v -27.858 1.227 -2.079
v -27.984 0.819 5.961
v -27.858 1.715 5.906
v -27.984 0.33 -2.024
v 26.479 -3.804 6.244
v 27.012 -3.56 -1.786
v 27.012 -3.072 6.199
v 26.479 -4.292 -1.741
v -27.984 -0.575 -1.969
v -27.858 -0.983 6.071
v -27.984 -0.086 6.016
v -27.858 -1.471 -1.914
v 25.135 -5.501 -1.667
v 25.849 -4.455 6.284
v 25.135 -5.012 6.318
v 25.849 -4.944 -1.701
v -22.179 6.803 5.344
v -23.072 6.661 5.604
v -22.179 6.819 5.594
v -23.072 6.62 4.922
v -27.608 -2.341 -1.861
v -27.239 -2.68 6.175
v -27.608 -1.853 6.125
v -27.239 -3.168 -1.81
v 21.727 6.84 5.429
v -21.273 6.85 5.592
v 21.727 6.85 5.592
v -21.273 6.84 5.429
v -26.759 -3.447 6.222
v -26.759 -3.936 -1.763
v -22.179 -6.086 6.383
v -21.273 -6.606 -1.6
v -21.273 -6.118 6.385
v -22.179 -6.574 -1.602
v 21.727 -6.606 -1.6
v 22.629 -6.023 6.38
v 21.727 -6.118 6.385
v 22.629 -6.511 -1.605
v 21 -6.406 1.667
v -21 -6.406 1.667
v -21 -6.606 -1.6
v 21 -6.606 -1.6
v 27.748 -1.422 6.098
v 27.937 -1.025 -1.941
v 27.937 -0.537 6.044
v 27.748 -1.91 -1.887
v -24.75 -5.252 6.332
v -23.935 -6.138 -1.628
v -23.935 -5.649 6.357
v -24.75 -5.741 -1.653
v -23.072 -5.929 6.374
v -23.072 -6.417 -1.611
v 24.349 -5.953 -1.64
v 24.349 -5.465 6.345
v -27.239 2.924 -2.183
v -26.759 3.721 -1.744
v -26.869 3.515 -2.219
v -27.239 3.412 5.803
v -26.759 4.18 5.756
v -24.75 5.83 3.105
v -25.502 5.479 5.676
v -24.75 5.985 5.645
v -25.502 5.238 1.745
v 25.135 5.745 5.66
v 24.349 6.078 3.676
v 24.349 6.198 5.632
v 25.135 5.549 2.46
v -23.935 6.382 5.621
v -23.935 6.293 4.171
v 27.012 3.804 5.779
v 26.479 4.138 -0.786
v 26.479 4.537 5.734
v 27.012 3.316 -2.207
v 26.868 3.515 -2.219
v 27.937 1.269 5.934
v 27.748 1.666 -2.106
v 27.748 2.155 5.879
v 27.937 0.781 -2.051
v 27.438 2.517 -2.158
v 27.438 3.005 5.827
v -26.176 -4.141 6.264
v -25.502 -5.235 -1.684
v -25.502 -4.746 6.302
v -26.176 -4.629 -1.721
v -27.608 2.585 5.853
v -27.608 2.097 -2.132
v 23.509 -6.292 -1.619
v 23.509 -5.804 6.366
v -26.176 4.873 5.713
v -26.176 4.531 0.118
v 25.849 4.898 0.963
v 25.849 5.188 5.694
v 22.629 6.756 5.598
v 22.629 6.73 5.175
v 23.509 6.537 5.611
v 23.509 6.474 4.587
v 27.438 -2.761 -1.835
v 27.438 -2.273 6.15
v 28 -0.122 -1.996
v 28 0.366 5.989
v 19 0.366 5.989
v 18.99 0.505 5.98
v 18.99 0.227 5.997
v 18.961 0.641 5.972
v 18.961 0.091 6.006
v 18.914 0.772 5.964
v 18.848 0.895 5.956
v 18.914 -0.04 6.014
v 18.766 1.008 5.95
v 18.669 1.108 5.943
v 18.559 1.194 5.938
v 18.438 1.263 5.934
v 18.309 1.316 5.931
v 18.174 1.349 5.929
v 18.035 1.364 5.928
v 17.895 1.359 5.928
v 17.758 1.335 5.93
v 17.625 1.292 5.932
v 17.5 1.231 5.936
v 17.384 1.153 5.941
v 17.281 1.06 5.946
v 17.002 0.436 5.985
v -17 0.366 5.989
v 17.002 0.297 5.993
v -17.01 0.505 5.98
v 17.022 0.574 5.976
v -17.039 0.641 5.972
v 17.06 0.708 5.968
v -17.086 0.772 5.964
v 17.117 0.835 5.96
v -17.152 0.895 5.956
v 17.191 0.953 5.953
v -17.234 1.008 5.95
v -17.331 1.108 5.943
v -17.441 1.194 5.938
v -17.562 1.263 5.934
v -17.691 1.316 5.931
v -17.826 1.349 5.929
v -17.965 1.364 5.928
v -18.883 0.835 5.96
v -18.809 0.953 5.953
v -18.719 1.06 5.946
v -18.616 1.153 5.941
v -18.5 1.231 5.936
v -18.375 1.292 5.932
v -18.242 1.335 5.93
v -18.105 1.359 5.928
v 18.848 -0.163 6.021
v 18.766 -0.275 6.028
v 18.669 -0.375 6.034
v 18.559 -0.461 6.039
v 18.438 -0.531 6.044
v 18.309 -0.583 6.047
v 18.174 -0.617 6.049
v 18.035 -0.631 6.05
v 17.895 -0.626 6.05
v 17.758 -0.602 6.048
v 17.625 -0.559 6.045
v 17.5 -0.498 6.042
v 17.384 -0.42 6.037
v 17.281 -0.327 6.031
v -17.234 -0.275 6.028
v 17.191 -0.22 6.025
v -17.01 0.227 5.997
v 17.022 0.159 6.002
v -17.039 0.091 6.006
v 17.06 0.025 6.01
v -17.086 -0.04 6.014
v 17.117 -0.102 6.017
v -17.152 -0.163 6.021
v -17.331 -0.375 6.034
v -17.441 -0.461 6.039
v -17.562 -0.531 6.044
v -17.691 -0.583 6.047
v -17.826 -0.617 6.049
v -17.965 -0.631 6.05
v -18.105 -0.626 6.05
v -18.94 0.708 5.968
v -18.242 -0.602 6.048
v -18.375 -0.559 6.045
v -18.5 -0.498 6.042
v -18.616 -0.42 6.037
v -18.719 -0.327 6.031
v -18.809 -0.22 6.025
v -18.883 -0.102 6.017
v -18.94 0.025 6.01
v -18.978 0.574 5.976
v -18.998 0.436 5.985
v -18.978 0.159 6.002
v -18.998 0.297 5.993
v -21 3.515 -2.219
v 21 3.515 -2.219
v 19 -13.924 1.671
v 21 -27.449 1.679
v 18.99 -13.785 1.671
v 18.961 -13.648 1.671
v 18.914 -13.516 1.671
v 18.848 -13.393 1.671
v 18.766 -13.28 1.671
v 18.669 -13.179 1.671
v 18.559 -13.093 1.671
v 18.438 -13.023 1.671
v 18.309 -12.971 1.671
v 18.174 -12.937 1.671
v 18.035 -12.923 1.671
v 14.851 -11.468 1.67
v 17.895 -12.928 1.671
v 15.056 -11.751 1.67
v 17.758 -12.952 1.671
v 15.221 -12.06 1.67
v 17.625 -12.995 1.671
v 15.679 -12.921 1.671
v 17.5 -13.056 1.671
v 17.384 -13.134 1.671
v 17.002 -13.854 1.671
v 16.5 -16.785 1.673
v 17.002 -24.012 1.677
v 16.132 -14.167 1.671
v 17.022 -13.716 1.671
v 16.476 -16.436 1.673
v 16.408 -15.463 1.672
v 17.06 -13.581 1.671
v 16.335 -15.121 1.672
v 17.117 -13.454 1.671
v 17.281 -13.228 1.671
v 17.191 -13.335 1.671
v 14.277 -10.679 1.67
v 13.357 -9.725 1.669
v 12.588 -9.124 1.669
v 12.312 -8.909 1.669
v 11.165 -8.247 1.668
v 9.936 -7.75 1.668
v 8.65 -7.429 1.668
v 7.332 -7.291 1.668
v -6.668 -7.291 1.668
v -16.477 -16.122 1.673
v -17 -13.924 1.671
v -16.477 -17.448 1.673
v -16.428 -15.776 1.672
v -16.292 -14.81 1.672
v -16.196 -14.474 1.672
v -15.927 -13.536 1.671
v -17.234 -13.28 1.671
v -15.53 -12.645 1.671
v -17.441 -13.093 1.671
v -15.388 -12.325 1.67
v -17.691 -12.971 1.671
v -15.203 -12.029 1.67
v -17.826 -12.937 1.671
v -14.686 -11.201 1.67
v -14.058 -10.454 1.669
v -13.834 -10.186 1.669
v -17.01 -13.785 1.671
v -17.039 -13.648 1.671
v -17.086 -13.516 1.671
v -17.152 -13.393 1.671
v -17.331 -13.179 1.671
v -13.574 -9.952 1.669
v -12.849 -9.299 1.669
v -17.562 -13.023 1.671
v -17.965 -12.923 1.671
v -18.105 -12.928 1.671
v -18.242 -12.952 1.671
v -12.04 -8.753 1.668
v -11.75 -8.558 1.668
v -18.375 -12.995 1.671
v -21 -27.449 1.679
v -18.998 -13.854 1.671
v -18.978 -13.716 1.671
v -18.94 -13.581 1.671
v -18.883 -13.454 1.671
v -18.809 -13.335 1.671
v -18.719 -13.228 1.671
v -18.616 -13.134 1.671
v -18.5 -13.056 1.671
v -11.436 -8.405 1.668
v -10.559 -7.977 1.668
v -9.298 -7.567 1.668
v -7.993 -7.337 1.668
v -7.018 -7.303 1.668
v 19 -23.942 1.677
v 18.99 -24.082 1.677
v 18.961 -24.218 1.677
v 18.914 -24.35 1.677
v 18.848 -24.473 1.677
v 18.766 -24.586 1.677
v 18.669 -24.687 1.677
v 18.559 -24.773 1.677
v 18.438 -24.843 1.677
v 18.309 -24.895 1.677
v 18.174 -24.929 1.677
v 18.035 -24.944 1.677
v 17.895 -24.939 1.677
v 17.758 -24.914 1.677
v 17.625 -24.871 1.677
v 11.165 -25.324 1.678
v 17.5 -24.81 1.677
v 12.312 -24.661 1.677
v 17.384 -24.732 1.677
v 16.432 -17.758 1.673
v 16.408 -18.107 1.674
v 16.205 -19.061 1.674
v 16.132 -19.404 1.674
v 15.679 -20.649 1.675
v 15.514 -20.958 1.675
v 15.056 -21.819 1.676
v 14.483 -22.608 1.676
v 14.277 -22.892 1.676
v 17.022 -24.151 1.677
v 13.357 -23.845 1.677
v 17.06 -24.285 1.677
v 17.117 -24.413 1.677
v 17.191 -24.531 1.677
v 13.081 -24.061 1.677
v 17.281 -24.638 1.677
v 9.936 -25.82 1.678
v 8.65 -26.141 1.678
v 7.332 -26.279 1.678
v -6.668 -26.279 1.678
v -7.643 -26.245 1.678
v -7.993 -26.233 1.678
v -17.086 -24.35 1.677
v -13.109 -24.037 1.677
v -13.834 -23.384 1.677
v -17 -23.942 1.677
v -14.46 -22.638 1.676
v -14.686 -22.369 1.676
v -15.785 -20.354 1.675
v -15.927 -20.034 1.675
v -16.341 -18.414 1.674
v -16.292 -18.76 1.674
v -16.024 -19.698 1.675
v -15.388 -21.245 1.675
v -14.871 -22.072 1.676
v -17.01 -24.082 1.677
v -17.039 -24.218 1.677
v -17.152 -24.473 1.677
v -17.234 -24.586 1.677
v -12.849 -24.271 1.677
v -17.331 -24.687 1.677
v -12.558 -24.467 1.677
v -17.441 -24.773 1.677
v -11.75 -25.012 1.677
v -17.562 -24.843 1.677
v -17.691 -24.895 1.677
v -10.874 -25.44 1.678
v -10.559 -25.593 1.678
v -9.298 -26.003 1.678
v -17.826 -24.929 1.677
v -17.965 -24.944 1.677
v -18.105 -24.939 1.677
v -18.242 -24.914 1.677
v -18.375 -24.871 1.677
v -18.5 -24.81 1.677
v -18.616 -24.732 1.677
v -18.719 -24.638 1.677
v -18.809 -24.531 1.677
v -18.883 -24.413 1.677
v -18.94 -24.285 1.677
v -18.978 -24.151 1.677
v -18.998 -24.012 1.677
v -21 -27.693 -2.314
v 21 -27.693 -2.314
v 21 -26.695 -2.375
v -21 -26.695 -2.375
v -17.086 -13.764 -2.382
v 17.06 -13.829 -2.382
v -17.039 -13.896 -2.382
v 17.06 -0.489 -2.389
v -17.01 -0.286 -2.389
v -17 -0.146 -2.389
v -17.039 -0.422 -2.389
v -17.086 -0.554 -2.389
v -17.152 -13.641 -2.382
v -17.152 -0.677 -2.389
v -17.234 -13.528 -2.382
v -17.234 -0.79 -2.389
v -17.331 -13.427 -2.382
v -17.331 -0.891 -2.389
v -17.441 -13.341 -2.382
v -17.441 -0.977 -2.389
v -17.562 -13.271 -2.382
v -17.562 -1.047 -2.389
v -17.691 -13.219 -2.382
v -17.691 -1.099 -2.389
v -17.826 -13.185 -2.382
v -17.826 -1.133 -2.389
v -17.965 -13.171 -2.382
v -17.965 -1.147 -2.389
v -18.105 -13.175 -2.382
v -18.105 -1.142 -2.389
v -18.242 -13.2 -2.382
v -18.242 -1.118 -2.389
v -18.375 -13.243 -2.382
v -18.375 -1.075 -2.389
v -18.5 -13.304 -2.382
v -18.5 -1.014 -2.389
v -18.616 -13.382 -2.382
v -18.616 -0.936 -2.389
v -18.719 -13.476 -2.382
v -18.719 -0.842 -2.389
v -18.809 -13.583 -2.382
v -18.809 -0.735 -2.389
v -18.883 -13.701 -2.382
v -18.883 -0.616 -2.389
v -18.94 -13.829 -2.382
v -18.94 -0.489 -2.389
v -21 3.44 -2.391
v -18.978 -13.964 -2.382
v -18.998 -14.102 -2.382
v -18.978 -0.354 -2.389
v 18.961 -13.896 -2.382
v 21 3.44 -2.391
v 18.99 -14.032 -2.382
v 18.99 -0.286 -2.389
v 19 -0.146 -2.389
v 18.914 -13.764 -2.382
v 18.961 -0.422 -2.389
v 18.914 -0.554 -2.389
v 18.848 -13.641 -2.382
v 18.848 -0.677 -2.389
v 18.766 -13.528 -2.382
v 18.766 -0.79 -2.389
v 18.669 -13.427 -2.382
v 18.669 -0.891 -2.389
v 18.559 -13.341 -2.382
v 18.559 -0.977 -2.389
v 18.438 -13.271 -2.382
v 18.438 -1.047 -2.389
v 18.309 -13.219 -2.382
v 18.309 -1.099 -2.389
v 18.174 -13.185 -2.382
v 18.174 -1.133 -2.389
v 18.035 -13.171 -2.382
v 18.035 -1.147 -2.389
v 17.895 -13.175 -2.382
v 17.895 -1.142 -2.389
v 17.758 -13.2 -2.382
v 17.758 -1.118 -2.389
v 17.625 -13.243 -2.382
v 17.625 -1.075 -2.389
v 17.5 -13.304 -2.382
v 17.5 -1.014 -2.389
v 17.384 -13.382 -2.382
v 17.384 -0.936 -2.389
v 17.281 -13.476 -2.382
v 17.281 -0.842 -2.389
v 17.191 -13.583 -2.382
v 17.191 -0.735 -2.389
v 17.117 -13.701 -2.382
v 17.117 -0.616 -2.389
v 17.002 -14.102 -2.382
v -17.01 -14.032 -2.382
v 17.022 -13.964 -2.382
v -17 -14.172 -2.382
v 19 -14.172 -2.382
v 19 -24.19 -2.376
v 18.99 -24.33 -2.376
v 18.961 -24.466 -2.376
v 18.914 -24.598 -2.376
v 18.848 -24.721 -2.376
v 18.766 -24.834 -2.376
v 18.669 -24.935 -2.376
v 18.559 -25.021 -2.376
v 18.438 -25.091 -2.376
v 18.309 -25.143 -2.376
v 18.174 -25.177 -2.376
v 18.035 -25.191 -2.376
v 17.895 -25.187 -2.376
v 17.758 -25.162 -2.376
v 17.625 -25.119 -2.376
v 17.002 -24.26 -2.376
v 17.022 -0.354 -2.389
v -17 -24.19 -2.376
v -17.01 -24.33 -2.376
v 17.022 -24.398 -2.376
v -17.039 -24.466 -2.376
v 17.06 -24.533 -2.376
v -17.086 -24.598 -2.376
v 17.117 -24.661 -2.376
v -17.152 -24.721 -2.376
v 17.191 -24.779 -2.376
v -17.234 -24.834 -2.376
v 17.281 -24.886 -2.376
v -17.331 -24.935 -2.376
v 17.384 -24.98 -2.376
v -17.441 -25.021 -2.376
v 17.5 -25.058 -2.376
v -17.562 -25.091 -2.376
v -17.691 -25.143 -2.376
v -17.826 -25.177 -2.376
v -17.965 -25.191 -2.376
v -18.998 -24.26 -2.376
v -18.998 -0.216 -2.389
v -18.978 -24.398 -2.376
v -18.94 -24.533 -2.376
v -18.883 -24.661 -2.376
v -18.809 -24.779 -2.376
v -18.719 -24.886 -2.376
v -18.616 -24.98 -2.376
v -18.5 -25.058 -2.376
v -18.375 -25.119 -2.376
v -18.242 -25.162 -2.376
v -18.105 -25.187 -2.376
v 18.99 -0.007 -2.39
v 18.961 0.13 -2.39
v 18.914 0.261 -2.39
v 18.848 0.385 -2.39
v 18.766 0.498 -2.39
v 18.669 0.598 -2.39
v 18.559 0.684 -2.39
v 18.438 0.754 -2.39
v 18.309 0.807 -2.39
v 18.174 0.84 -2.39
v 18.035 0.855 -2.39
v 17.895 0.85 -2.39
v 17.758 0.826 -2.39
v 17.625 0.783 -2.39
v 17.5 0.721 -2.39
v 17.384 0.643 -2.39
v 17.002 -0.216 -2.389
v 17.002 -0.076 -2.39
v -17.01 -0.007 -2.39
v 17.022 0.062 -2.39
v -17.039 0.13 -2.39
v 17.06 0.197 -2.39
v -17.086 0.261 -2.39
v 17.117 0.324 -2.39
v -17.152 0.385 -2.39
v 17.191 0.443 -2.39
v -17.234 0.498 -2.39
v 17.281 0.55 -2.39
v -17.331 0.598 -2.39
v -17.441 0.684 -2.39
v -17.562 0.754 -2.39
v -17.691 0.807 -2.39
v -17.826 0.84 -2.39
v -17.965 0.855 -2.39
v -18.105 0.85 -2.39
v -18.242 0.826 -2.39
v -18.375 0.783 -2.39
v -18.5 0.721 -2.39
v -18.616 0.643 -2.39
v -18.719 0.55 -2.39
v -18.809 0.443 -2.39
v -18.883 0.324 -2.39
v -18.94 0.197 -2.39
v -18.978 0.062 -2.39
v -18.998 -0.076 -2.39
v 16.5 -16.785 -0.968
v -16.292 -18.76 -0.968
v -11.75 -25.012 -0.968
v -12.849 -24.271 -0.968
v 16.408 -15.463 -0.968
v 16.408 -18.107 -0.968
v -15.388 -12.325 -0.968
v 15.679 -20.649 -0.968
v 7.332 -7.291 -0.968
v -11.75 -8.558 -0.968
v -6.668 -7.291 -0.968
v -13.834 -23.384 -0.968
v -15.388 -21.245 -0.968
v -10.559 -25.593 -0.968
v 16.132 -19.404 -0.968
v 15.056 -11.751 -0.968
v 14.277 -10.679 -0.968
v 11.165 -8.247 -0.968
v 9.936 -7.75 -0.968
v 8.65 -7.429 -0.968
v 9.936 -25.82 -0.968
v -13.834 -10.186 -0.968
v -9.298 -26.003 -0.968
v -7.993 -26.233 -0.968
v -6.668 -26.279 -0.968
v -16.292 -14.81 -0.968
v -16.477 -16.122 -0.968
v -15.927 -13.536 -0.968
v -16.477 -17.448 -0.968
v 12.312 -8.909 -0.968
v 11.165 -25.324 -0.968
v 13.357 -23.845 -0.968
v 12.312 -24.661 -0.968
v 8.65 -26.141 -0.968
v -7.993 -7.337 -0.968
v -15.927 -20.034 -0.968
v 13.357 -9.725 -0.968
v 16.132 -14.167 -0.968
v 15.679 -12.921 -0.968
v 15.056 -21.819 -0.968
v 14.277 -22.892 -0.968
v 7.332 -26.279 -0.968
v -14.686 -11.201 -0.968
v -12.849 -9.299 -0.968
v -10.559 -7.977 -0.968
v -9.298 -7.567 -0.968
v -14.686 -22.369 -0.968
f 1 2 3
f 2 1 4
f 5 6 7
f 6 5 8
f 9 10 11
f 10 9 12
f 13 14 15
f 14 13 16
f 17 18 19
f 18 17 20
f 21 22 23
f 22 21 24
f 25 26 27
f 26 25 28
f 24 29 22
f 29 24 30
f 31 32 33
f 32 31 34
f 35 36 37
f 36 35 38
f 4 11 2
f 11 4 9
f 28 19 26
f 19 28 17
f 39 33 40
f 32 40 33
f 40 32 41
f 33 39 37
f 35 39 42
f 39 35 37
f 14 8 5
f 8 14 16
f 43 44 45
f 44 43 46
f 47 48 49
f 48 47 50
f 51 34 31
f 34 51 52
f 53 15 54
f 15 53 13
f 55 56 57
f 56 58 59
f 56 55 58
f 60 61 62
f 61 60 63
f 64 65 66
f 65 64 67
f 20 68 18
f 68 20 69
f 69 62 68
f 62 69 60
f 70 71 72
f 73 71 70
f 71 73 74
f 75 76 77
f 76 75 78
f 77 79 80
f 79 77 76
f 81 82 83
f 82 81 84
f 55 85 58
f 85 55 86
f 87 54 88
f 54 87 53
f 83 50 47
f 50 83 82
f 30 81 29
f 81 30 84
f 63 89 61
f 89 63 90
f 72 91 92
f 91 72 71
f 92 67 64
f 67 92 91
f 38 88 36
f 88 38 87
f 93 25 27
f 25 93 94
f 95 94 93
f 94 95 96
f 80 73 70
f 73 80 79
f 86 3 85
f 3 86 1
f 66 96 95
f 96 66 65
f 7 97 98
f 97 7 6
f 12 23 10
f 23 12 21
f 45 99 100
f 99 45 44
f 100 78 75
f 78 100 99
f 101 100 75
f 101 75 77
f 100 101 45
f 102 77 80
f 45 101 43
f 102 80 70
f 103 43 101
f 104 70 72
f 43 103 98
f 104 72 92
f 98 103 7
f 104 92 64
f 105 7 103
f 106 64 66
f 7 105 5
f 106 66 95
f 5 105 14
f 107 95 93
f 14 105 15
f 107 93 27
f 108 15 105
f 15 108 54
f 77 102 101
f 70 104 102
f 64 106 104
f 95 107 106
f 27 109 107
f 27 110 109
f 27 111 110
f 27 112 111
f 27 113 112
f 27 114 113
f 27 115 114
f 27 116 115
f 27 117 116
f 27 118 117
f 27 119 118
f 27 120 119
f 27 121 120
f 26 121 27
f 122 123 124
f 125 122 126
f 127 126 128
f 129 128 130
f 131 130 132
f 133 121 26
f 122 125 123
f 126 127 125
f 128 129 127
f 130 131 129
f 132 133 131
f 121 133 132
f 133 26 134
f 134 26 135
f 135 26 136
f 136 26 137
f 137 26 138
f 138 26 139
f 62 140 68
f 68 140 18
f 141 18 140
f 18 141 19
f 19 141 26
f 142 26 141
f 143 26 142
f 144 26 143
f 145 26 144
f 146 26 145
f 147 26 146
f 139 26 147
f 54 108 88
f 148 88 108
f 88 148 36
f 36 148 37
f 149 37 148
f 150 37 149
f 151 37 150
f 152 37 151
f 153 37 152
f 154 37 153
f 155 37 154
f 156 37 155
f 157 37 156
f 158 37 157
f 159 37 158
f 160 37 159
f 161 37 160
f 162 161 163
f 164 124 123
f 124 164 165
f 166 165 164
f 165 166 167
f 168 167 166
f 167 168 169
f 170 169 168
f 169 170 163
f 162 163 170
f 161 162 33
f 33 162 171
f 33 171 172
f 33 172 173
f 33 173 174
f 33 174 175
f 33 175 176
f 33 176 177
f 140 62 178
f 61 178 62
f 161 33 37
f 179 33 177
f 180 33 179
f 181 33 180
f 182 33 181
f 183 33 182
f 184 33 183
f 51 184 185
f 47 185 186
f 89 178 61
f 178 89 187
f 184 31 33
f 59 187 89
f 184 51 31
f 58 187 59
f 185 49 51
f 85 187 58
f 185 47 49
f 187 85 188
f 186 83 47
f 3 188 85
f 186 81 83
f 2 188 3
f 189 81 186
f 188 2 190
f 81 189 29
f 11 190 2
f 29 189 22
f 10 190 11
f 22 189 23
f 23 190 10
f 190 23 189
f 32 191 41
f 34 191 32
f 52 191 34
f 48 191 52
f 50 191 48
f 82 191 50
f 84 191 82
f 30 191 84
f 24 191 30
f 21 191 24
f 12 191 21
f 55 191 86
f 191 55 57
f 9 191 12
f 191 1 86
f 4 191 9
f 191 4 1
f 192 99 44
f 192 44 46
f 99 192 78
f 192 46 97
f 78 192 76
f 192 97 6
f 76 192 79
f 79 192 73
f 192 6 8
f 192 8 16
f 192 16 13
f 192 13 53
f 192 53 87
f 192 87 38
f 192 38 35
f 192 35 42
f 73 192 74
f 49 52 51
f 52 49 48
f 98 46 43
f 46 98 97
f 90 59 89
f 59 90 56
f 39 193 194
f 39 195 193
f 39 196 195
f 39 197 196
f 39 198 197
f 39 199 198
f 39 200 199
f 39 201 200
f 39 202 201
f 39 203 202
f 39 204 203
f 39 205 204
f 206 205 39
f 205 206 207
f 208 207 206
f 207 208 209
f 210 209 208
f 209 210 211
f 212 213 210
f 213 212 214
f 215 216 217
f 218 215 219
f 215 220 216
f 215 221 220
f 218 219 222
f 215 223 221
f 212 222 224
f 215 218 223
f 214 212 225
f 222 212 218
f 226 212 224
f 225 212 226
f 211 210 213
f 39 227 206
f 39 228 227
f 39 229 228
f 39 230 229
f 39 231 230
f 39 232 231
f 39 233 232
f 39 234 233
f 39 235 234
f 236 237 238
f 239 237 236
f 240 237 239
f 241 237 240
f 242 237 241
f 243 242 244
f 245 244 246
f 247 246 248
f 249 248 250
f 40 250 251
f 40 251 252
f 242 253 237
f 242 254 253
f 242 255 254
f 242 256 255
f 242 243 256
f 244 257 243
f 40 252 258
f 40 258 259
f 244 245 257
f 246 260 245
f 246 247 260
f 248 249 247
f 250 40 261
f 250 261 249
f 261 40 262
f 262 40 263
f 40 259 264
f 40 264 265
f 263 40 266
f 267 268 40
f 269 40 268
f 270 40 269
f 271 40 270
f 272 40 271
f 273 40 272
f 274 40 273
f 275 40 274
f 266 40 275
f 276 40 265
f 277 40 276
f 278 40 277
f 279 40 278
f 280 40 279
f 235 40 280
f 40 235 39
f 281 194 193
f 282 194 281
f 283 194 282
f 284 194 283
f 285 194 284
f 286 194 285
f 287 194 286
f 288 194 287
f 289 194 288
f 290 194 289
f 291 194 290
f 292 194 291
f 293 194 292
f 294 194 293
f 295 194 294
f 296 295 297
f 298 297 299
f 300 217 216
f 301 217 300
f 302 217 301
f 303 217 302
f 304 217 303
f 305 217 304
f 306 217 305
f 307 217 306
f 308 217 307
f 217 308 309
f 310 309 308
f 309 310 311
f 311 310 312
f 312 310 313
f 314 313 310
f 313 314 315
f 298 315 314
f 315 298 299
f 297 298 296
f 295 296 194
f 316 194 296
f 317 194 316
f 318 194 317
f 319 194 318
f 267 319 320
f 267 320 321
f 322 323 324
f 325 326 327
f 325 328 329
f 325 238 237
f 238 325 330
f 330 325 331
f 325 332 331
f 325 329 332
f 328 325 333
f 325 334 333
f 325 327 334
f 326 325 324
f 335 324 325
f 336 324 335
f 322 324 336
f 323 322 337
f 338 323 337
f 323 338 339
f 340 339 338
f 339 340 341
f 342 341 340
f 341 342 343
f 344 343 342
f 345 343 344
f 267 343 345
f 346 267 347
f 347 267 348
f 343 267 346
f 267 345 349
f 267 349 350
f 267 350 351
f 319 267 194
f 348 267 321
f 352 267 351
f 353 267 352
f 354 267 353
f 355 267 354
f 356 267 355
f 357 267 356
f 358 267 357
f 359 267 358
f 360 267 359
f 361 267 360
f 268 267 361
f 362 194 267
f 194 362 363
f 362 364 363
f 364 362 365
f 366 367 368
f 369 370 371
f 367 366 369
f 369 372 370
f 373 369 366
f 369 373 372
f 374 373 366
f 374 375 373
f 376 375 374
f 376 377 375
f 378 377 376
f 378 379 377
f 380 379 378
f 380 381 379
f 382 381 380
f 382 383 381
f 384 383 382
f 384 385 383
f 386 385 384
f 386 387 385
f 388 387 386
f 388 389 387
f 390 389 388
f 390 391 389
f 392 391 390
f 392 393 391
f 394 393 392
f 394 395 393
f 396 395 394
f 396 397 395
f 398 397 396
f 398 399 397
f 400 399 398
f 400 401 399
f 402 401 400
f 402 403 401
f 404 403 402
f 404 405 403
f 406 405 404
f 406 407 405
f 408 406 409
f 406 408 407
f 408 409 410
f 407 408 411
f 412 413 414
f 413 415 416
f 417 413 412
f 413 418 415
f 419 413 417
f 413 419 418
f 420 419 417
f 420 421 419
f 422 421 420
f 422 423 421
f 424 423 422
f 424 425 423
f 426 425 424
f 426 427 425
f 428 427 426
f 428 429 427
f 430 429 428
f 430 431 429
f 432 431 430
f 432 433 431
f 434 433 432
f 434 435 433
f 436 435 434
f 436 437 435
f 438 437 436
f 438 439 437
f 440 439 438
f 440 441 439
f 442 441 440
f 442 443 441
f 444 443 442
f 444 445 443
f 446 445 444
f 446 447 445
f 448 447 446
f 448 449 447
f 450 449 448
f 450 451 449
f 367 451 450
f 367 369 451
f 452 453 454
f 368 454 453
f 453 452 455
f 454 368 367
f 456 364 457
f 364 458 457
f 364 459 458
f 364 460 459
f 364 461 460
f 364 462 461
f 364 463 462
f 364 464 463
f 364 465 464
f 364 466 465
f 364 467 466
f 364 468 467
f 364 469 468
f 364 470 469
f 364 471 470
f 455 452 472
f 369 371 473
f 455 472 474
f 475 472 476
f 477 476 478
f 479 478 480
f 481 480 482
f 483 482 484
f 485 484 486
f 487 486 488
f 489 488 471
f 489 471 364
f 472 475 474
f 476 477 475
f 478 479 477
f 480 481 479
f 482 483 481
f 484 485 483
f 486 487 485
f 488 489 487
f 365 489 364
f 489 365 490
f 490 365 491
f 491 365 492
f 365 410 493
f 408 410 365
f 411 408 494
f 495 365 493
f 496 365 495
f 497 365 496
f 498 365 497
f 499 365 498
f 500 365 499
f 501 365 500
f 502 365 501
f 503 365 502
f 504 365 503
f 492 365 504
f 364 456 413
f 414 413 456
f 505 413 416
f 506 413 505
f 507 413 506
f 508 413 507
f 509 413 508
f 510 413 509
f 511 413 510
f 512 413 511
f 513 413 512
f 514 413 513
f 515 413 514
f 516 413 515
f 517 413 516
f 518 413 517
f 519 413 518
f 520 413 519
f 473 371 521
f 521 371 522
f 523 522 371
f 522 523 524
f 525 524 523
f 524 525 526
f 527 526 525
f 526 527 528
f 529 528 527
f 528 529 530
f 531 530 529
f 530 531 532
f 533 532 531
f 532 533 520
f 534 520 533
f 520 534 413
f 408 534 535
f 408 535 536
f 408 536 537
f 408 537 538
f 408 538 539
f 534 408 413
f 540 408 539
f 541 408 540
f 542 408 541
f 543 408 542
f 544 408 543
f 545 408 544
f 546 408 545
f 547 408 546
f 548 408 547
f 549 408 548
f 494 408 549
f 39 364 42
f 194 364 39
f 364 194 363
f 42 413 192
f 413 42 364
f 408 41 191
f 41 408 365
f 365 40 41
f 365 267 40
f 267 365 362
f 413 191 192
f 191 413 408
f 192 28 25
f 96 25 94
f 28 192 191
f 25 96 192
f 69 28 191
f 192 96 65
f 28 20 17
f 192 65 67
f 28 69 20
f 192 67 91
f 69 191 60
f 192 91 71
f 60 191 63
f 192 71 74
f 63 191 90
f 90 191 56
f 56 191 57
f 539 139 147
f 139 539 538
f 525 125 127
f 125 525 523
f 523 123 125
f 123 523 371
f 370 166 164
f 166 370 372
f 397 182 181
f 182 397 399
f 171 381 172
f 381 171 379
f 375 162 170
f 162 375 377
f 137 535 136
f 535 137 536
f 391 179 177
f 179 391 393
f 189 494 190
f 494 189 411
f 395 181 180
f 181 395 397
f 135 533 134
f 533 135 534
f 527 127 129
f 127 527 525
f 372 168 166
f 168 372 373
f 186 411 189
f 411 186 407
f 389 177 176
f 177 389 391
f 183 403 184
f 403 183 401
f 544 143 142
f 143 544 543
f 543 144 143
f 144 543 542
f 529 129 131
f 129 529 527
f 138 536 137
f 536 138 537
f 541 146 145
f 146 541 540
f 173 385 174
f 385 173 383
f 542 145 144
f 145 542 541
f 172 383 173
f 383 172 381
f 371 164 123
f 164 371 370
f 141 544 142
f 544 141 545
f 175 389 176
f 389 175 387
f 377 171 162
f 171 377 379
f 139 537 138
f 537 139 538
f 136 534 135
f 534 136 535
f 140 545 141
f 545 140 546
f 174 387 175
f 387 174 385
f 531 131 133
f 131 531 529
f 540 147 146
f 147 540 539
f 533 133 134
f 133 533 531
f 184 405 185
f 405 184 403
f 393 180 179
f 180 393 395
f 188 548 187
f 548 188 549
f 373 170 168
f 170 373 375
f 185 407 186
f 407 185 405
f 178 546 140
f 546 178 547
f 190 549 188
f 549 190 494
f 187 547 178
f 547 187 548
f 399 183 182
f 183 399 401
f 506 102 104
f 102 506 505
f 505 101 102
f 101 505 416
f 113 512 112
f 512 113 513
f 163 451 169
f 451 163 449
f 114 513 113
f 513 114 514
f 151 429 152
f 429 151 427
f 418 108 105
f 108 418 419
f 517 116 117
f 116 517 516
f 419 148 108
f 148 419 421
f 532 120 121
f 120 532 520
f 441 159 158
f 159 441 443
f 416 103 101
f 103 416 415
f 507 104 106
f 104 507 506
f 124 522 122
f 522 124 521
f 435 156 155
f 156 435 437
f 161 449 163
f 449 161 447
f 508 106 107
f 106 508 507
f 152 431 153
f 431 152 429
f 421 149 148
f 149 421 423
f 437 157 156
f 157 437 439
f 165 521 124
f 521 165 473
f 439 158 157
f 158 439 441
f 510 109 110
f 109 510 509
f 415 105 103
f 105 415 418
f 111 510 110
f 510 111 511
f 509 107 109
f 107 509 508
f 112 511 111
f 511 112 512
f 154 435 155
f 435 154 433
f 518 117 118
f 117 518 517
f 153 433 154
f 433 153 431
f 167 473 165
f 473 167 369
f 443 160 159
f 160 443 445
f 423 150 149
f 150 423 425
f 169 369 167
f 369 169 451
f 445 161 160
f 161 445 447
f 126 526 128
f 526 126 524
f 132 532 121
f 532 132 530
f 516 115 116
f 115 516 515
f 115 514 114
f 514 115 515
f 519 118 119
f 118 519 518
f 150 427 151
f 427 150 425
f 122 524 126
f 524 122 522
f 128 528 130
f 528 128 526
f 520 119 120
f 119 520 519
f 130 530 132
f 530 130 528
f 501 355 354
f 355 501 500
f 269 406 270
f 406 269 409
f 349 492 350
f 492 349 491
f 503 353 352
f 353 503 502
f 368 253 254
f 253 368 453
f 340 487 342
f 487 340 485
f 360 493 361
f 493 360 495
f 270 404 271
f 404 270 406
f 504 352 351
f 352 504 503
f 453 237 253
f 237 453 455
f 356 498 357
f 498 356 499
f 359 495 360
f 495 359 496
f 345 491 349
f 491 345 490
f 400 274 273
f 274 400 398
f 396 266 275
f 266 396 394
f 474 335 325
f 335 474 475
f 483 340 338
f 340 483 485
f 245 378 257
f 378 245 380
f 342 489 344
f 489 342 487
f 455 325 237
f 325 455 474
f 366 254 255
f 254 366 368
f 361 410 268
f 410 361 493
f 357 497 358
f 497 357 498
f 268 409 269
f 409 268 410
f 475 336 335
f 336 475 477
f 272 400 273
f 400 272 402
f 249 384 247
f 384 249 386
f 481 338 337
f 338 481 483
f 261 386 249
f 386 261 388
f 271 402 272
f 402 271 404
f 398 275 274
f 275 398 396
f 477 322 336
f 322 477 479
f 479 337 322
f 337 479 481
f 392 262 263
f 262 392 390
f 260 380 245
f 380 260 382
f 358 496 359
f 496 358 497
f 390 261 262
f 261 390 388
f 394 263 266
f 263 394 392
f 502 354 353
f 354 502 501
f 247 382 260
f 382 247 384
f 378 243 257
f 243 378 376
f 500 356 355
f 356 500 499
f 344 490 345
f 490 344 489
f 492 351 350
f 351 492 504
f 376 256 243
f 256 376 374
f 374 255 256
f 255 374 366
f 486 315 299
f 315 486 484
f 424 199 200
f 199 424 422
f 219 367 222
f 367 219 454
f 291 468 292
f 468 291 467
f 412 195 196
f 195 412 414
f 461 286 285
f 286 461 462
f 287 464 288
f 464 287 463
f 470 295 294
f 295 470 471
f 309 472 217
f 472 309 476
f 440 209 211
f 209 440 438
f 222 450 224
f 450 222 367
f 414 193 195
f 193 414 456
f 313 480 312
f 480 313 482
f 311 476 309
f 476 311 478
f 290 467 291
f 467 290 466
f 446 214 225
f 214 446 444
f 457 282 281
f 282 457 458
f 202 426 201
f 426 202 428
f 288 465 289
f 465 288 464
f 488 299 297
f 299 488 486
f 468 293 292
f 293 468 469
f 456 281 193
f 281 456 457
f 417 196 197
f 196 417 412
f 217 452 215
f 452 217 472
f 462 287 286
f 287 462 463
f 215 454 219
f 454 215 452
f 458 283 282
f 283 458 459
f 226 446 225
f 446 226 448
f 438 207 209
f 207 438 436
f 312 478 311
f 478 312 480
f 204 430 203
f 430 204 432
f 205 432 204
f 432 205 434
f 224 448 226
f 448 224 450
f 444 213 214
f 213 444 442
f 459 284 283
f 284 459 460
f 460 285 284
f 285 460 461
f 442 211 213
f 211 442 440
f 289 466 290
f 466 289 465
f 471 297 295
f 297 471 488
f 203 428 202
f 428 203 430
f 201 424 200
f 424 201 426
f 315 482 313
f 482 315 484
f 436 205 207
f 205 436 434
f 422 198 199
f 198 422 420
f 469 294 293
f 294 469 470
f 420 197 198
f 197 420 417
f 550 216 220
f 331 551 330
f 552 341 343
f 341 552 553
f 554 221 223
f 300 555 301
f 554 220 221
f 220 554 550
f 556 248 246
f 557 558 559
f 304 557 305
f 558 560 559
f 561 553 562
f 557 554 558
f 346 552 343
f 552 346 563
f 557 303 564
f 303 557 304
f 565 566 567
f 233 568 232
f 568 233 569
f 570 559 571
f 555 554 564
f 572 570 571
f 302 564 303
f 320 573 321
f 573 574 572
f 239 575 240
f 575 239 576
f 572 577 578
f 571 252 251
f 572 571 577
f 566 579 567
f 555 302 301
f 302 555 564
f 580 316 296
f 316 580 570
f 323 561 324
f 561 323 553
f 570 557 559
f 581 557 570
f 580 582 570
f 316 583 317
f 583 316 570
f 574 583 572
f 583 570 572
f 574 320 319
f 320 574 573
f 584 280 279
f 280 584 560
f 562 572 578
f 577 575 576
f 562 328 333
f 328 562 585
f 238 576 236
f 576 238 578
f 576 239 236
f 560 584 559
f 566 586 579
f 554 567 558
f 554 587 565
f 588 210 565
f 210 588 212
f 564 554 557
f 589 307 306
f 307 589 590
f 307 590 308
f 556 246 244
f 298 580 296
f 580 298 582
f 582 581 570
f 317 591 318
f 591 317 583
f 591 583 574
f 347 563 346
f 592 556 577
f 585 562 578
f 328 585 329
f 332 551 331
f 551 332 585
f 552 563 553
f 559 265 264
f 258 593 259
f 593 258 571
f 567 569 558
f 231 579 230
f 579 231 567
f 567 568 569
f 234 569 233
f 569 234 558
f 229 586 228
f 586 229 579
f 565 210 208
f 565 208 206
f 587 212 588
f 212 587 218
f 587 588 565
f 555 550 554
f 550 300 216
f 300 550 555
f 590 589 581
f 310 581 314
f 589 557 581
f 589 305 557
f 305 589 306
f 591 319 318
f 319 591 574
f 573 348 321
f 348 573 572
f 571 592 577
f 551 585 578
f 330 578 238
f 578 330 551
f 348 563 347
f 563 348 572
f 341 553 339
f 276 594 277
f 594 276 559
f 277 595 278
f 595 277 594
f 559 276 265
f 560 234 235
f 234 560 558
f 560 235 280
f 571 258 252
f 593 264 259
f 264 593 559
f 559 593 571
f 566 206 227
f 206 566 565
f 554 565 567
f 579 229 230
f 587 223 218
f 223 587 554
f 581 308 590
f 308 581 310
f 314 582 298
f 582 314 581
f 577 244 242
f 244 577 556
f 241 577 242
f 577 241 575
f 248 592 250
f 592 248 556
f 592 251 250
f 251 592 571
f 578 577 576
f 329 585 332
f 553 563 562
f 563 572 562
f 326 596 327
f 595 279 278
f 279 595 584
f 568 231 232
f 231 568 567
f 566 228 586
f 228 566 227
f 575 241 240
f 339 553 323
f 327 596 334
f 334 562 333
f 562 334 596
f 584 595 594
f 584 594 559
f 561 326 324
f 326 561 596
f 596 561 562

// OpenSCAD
flatten = 93.5;
$fn=45;

rotate([-flatten,0,0])it_with_holes();


module through(){
  cylinder(h=20,r=1, center=true);
}module through2()hull(){
  cylinder(h=20,r=1, center=true);
  translate([0,10,0])cylinder(h=20,r=1, center=true);
}

module it_with_holes()difference(){
  it();
  #translate([-18,0,0])rotate([90,0,0])through();
  #translate([18,0,0])rotate([90,0,0])through();
  #translate([-18,0,-24])rotate([90,0,0])through2();
  #translate([18,0,-24])rotate([90,0,0])through2();
  hull() {
    translate([7,-3,-17])rotate([flatten,0,0])cylinder(h=10,r=9.5, center=true);
    translate([-7,-3,-17])rotate([flatten,0,0])cylinder(h=10,r=9.5, center=true);
  }
}


module it()difference(){
  union(){
    rotate([90,0,0])hull() {
      translate([21.5,0,-2])cylinder(h=8, r=6.5);
      translate([-21.5,0,-2])cylinder(h=8, r=6.5);
    }

    hull() {
      translate([0,0,6])cube([42,4,1], center=true);
      translate([0,2,-27])cube([42,4,1], center=true);
    }
  }
 # translate([-40,0,6.5])rotate([70,0,0])translate([0,-2,-15])cube(80,40,40);
}
